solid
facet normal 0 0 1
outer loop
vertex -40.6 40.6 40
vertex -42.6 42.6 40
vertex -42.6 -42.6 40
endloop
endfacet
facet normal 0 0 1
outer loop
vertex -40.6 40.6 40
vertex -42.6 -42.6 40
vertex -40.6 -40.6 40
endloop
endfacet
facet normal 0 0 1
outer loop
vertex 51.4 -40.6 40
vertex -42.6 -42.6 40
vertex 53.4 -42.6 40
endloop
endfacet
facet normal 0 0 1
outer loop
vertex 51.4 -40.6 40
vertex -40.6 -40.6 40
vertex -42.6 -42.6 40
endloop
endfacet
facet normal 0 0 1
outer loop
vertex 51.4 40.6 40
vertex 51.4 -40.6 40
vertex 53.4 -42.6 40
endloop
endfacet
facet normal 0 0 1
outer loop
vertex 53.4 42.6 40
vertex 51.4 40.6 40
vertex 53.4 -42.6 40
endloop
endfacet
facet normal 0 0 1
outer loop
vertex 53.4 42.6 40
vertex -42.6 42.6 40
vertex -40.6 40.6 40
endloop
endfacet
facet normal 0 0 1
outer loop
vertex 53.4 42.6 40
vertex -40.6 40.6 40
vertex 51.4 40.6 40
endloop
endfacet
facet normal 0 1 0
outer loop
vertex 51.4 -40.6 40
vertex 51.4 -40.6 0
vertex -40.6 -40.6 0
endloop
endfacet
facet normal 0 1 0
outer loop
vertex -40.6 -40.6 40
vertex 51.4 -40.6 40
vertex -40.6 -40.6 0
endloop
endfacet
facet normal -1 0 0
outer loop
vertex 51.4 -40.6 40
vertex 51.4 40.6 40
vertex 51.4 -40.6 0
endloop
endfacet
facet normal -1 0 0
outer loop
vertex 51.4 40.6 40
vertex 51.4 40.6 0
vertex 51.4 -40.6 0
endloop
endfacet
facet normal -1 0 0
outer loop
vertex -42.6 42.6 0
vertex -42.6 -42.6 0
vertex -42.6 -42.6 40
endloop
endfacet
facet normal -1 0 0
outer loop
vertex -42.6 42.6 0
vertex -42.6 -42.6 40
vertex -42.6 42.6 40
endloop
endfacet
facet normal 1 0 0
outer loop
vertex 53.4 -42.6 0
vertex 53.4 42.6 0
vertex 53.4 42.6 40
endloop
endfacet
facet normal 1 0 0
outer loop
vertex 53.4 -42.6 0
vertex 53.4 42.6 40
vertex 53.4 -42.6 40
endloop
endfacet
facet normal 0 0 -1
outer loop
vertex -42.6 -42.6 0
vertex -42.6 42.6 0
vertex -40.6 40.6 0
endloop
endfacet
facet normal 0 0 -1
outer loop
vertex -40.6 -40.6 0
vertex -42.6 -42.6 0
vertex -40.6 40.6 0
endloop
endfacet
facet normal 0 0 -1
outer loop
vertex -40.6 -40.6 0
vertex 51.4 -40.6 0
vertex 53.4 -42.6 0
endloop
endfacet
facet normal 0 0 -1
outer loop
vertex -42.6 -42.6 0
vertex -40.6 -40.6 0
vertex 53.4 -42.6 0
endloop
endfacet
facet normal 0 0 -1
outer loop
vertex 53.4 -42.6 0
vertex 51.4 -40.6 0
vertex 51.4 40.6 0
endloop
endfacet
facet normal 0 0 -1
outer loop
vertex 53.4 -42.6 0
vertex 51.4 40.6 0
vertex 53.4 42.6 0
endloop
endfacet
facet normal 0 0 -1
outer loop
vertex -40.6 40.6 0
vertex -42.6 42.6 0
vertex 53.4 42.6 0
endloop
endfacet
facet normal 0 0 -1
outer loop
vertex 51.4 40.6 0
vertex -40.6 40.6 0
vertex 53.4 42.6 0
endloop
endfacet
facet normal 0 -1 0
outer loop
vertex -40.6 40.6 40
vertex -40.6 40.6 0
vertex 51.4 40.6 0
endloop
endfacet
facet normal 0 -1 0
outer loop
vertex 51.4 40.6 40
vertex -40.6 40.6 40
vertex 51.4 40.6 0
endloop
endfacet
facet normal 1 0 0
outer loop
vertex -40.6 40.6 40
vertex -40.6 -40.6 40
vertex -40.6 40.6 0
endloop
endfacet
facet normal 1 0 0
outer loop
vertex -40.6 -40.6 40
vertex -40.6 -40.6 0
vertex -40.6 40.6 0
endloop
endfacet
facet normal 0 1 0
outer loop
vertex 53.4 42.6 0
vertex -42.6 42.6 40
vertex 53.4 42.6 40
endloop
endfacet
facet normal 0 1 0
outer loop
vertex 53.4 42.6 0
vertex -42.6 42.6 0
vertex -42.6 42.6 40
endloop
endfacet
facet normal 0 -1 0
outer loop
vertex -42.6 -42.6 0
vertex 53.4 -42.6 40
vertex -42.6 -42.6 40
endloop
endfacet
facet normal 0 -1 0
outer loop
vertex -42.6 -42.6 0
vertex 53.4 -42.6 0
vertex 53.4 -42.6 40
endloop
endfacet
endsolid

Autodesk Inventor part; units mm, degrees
ref_plane "YZ Plane" through (0, 0, 0) normal (1, 0, 0) x (0, 1, 0)
ref_plane "XZ Plane" through (0, 0, 0) normal (0, 1, 0) x (-1, 0, 0)
ref_plane "XY Plane" through (0, 0, 0) normal (0, 0, 1) x (1, 0, 0)
sketch "Sketch1" plane through (0, 0, 0) normal (0, 0, 1) x (1, 0, 0)
  line L0 (-40.6, 40.6) -> (51.4, 40.6)
  line L1 (51.4, 40.6) -> (51.4, -40.6)
  line L2 (51.4, -40.6) -> (-40.6, -40.6)
  line L3 (-40.6, -40.6) -> (-40.6, 40.6)
  line L4 (-42.6, 42.6) -> (53.4, 42.6)
  line L5 (53.4, 42.6) -> (53.4, -42.6)
  line L6 (53.4, -42.6) -> (-42.6, -42.6)
  line L7 (-42.6, -42.6) -> (-42.6, 42.6)
  point P0 (0, 0)
  dimension "d0" = 92
  dimension "d1" = 81.2
  dimension "d2" = 40.6
  dimension "d3" = 40.6
  dimension "d4" = 2
  dimension "d5" = 2
  dimension "d6" = 2
  dimension "d7" = 2
extrude "Extrusion1" add sketch "Sketch1" along normal blind 40
properties part number "expected_size"
